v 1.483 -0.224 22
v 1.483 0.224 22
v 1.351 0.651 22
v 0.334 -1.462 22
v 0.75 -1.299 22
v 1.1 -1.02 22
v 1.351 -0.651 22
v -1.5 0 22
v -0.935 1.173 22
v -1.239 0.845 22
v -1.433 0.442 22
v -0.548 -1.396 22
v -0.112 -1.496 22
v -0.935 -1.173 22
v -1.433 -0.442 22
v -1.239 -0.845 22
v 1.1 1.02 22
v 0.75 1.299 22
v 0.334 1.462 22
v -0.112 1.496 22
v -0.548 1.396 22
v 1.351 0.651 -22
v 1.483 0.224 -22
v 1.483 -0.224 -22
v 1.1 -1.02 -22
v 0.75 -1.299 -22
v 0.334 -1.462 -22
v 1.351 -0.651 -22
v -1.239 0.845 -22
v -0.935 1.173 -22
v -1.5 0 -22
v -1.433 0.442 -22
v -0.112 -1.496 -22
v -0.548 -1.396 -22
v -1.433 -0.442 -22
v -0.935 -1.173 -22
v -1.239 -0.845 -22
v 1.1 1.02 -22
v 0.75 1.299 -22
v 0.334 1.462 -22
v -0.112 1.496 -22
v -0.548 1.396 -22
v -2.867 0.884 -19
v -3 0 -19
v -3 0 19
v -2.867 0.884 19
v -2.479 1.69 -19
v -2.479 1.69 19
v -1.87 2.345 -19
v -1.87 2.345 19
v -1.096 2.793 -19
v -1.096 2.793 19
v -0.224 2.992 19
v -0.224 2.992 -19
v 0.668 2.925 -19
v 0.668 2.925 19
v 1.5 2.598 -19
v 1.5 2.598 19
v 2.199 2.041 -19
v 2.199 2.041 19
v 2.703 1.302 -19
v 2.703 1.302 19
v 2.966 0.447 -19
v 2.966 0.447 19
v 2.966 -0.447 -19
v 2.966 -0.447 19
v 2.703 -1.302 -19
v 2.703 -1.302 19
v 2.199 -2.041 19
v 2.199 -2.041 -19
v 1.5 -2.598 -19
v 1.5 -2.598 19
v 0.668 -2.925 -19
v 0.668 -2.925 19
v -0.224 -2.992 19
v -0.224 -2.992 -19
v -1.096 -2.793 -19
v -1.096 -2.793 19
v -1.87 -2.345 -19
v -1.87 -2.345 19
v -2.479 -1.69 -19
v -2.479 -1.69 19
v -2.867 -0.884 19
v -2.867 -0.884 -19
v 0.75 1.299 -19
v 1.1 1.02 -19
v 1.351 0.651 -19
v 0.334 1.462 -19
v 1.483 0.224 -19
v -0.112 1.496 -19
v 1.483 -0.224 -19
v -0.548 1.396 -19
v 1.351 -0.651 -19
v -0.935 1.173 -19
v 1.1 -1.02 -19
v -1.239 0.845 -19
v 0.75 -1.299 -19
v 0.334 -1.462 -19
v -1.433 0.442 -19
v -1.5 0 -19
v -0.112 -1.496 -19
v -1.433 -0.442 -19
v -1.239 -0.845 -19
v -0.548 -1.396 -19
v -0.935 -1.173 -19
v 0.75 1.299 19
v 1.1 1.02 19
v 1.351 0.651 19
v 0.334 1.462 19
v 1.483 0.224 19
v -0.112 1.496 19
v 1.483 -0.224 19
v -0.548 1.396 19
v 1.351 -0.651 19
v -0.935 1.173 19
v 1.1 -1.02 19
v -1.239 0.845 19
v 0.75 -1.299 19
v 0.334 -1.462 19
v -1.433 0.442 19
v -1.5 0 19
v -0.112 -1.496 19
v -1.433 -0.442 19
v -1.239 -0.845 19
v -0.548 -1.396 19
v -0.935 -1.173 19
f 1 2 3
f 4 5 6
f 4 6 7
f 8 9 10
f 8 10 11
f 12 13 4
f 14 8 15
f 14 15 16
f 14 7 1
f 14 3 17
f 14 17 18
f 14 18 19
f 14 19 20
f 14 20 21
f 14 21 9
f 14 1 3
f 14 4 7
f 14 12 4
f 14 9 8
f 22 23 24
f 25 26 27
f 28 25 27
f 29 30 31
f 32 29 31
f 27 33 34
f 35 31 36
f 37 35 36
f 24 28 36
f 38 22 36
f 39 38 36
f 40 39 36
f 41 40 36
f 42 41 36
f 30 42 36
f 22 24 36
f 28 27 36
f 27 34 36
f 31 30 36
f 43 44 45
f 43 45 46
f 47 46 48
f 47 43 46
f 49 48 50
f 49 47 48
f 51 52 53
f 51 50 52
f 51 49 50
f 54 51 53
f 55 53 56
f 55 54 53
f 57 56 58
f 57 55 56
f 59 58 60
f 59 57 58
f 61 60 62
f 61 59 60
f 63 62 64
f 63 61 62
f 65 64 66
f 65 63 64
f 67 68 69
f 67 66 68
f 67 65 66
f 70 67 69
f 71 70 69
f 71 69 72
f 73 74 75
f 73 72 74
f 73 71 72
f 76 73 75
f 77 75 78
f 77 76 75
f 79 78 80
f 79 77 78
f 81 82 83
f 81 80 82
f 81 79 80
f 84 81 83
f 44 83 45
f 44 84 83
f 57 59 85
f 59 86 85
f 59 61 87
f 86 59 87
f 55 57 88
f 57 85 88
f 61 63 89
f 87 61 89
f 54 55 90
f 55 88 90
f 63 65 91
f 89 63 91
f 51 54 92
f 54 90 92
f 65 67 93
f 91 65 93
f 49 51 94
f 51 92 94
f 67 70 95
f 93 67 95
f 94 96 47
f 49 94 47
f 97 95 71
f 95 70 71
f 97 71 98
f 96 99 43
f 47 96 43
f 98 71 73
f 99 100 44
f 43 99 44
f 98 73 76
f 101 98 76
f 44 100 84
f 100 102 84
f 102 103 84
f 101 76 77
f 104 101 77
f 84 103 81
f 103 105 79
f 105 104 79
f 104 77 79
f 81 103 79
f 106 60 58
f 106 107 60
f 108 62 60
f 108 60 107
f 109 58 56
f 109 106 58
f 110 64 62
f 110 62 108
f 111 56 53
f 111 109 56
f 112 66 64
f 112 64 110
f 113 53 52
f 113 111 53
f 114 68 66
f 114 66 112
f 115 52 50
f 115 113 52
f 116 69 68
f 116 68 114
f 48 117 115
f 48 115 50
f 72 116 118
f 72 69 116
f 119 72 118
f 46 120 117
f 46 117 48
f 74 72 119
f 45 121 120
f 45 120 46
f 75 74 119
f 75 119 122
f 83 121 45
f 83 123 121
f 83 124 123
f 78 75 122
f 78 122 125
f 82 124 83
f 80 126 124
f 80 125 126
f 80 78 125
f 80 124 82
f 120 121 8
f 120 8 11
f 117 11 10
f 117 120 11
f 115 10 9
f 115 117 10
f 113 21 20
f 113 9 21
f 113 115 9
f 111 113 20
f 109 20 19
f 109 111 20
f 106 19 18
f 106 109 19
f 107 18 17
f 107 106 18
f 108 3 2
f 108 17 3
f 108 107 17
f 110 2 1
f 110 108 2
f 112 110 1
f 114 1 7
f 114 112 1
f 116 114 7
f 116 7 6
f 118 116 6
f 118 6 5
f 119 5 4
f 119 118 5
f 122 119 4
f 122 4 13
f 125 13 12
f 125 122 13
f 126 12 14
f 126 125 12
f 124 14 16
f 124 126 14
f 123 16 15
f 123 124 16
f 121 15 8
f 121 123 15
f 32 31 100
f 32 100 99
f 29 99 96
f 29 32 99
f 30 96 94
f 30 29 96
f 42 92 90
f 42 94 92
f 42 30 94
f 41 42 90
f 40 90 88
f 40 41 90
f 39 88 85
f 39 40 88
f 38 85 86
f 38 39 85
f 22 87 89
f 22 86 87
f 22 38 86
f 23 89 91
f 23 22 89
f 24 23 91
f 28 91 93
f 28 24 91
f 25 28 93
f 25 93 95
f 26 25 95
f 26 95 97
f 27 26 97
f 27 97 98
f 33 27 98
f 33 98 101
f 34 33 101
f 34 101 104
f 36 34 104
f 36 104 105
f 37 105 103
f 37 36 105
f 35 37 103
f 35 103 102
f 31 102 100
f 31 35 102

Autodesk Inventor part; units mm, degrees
ref_plane "YZ Plane" through (0, 0, 0) normal (1, 0, 0) x (0, 1, 0)
ref_plane "XZ Plane" through (0, 0, 0) normal (0, 1, 0) x (-1, 0, 0)
ref_plane "XY Plane" through (0, 0, 0) normal (0, 0, 1) x (1, 0, 0)
sketch "Sketch1" plane through (0, 0, 0) normal (0, 1, 0) x (-1, 0, 0)
  line L0 (0, -22) -> (0, 22)
  line L1 (0, 22) -> (1.5, 22)
  line L2 (1.5, 22) -> (1.5, 19)
  line L3 (1.5, 19) -> (3, 19)
  line L4 (3, 19) -> (3, -19)
  line L5 (3, -19) -> (1.5, -19)
  line L6 (1.5, -19) -> (1.5, -22)
  line L7 (1.5, -22) -> (0, -22)
  point P0 (0, 0)
  point P1 (0, 0)
  point P2 (3, 0)
  dimension "d1" = 6
  dimension "d2" = 3
  dimension "d3" = 3
  dimension "d4" = 44
revolve "Revolution1" add sketch "Sketch1" angle 360 about axis through (0, 0, -22) along (0, 0, 1)
thread "Thread1" size "M3x0.5" class "6g" standard "ANSI Metric M Profile" full length
thread "Thread2" size "M3x0.5" class "6g" standard "ANSI Metric M Profile" full length
equation "\"d4\" = L"
equation "\"L\" = 44"
properties part number "Shaft" material "Stainless Steel"
